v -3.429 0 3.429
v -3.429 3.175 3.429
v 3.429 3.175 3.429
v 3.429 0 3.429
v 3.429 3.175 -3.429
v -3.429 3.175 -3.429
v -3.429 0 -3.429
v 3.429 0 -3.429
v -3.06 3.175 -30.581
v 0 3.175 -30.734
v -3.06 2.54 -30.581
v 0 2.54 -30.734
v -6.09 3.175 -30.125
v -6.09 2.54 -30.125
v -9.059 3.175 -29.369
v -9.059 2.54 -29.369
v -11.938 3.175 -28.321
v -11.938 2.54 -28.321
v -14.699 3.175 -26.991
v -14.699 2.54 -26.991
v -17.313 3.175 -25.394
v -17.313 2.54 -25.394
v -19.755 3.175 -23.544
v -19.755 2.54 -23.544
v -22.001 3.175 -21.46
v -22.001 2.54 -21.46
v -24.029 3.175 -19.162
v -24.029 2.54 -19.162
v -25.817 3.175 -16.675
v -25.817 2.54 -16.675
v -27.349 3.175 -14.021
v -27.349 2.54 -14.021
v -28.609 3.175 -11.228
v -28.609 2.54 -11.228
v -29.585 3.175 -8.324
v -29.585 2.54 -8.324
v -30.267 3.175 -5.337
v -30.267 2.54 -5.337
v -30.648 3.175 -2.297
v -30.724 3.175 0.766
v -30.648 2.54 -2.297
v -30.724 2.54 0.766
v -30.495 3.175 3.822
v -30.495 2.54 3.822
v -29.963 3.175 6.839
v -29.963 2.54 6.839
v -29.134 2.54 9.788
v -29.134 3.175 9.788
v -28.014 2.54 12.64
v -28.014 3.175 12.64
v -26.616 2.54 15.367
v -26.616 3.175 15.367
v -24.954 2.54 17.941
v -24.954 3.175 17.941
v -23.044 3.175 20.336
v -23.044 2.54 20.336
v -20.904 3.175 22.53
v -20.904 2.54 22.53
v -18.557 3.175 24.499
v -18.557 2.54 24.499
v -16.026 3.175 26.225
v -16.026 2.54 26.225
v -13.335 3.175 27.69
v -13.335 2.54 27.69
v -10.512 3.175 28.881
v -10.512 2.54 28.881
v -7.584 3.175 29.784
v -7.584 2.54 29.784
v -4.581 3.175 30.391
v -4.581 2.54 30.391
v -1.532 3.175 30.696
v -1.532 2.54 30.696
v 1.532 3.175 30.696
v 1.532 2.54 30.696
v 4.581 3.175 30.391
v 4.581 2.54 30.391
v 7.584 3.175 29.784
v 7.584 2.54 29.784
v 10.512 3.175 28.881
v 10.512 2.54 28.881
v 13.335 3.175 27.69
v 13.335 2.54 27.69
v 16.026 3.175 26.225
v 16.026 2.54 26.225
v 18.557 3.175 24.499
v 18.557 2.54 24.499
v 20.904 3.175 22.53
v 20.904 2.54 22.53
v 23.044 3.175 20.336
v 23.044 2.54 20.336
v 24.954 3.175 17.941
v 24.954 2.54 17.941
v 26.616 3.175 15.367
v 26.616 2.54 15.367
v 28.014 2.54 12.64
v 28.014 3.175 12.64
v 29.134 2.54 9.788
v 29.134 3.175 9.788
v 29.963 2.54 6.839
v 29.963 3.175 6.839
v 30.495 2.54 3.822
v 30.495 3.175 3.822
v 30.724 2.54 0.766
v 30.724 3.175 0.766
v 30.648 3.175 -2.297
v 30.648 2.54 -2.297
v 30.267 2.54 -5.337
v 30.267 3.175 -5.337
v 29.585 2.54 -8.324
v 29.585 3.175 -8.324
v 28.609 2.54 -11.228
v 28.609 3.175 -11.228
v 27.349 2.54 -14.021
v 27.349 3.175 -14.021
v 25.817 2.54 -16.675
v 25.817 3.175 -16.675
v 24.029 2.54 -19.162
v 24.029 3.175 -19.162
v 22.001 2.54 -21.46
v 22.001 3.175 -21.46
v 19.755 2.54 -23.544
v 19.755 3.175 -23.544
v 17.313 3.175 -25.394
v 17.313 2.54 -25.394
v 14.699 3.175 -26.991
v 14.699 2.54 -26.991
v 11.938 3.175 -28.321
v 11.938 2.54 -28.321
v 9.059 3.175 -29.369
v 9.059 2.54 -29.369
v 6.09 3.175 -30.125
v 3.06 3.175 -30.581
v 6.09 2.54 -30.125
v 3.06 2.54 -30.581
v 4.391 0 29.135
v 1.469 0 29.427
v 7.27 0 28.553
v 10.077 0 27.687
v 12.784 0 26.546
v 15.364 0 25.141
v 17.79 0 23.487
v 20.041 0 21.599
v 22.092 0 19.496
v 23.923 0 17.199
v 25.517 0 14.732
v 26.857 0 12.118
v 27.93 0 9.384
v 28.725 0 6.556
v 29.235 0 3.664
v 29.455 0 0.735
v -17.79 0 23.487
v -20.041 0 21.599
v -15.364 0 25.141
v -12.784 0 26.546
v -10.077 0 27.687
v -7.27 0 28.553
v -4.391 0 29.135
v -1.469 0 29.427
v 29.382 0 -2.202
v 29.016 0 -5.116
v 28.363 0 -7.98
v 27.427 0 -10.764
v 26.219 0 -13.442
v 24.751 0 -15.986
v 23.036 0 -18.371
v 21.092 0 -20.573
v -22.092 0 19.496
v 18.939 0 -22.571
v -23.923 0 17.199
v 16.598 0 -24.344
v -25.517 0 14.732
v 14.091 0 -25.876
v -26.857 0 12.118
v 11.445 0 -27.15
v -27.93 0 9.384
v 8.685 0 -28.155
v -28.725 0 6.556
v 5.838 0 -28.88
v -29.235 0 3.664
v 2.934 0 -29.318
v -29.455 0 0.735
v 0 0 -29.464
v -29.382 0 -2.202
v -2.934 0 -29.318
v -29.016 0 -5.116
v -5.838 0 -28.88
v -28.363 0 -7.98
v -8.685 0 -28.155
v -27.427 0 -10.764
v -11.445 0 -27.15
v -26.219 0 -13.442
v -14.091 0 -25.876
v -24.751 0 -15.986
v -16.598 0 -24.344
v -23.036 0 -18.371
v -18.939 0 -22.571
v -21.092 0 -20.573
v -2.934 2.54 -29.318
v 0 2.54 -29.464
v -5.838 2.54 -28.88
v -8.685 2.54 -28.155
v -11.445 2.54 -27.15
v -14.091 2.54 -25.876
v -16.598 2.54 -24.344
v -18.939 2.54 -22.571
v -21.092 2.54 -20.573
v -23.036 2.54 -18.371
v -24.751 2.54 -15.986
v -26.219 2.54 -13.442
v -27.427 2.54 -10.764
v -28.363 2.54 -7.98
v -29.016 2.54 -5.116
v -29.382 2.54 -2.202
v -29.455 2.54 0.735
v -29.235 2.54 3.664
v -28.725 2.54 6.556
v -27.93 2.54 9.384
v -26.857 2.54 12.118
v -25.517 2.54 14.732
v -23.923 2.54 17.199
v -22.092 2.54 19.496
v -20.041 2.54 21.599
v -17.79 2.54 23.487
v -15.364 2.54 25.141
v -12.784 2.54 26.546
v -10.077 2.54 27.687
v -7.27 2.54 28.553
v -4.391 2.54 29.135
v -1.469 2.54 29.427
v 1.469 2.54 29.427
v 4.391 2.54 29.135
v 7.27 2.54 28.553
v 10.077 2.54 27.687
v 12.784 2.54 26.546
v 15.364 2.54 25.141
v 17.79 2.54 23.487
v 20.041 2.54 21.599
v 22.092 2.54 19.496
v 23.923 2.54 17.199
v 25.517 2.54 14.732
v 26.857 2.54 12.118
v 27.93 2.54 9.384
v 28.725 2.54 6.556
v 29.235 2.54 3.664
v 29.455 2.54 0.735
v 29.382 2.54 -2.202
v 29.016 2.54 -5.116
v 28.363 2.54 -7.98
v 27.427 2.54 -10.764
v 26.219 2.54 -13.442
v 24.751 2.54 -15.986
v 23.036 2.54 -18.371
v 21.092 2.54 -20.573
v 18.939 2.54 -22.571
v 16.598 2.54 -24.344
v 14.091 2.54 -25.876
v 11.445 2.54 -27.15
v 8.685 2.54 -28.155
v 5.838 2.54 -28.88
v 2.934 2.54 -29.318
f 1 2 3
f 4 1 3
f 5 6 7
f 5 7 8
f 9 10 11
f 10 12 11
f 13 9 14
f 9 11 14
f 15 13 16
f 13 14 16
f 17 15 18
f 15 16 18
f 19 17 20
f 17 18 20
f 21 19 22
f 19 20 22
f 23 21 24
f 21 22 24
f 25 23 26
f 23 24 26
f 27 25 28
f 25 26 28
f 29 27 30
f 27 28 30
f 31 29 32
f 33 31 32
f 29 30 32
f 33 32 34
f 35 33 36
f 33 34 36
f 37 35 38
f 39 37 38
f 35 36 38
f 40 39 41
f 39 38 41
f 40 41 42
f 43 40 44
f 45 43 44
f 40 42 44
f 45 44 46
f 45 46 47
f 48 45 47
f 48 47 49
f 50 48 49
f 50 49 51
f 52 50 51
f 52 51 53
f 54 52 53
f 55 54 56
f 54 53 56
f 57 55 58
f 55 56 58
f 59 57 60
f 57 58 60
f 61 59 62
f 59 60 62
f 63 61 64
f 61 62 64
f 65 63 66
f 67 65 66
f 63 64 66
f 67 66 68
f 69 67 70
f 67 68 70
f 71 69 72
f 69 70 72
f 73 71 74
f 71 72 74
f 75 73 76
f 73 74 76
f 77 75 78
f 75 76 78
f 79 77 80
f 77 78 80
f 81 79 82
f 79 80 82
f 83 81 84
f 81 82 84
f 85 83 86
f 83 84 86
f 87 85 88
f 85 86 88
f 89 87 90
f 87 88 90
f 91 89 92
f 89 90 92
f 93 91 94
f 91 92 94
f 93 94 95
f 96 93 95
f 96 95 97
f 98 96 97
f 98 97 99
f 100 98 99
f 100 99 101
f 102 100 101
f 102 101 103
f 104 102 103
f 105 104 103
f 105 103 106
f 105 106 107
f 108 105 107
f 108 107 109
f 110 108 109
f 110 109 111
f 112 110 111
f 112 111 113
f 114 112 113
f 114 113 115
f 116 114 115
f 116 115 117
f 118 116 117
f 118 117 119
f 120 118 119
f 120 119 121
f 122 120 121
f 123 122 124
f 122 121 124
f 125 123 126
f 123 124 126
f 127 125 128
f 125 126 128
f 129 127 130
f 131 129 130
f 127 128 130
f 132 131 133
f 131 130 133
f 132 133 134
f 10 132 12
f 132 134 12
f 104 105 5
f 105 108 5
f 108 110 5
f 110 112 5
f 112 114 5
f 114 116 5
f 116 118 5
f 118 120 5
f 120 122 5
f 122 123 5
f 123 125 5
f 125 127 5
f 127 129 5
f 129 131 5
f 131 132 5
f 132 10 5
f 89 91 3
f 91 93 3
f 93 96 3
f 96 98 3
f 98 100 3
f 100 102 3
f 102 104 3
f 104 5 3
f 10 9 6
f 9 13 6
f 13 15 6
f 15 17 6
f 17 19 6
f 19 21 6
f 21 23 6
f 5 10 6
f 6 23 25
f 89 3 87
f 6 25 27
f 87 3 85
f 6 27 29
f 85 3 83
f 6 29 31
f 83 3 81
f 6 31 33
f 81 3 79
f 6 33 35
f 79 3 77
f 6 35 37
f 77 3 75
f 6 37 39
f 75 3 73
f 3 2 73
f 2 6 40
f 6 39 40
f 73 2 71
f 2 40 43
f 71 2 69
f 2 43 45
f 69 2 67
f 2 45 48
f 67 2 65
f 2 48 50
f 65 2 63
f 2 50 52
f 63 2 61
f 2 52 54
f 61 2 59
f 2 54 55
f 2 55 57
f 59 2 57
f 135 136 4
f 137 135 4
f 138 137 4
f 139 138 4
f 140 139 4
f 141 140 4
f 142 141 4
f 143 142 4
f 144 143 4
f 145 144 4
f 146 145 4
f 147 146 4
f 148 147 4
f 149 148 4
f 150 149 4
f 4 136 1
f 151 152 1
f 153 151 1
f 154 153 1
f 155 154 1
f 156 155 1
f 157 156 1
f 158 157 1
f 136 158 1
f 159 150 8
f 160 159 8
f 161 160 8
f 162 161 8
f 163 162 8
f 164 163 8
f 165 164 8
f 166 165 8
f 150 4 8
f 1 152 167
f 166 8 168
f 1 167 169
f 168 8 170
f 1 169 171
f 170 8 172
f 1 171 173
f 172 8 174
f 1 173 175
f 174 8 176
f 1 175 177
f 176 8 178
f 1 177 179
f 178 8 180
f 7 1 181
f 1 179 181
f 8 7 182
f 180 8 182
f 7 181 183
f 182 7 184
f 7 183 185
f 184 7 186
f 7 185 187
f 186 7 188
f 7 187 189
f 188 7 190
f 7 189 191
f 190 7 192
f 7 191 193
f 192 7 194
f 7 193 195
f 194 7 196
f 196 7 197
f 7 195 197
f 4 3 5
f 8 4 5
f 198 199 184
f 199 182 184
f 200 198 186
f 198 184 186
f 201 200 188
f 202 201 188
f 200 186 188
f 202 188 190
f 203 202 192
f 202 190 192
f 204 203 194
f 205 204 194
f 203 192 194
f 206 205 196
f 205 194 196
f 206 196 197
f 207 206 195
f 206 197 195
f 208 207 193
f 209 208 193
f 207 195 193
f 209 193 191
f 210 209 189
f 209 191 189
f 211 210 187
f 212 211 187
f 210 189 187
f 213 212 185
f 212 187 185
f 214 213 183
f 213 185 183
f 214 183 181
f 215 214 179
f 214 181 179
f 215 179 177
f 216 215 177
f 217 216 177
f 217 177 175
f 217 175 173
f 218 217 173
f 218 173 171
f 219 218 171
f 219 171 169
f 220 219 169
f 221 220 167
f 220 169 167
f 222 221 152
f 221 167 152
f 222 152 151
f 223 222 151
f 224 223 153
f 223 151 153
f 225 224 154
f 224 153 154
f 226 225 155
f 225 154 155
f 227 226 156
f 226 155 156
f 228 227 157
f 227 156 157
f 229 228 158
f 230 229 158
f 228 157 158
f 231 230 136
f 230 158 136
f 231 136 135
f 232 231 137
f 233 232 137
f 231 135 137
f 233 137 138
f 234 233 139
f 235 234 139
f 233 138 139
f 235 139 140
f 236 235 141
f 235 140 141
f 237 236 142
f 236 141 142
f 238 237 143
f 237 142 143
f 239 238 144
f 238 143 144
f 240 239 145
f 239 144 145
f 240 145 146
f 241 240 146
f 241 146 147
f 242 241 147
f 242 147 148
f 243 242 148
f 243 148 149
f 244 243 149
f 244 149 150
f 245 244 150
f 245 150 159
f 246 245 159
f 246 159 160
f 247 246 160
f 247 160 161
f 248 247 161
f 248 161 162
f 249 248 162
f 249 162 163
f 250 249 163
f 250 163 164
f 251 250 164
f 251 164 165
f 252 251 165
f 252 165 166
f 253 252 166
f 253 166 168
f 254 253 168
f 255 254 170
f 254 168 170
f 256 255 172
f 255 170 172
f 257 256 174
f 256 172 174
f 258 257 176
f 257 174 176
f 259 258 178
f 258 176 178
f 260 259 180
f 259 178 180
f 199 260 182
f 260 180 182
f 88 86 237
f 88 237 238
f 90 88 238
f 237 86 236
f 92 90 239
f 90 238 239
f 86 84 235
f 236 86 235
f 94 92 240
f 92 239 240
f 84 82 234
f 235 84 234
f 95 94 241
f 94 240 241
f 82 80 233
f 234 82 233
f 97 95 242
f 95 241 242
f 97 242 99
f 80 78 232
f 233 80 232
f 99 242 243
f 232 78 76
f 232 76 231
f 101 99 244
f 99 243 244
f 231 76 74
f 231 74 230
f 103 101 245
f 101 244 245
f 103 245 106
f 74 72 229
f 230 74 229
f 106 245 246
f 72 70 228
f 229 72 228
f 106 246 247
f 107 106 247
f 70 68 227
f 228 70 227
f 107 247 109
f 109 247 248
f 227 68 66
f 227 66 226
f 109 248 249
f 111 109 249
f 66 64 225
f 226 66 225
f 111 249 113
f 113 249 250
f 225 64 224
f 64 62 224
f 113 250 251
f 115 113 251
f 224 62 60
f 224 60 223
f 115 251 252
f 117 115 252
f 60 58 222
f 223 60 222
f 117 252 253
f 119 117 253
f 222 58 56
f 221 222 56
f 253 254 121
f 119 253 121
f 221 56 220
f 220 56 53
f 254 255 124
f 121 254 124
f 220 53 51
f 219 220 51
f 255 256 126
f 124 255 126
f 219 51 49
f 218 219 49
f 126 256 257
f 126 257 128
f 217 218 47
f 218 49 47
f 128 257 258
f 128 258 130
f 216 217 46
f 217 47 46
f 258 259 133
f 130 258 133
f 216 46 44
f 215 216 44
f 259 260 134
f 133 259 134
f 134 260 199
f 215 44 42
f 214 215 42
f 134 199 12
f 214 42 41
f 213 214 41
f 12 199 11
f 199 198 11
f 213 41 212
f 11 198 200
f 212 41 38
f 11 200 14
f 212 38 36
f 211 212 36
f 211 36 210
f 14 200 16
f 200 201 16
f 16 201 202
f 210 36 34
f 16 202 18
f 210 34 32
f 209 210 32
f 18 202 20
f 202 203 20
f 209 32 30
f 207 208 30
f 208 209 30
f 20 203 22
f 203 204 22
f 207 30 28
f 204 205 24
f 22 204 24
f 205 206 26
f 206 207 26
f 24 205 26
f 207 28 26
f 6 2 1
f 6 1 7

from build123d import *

# Parameters (mm, degrees)
SKETCH2_W          = 6.858
SKETCH2_H          = 6.858
CUT_EXTRUDE1_DEPTH = 44.580249391


with BuildPart() as part:
    # Sketch1 → Revolve1 (revolve)
    with BuildSketch(Plane.XY, mode=Mode.PRIVATE) as revolve1_sk:
        Polygon((0, 3.175), (-30.734, 3.175), (-30.734, 2.54), (-29.464, 2.54), (-29.464, 0), (0, 0), align=None)
    revolve(revolve1_sk.sketch.rotate(Axis((0, 0, 0), (0, 1, 0)), 270), axis=Axis((0, 0, 0), (0, 1, 0)))

    # Sketch2 → Cut-Extrude1 (cut, through all)
    with BuildSketch(Plane(origin=(0, 3.175, 0), x_dir=(1, 0, 0), z_dir=(0, 1, 0))):
        Rectangle(SKETCH2_W, SKETCH2_H)
    extrude(amount=-CUT_EXTRUDE1_DEPTH, mode=Mode.SUBTRACT)


solid = part.part
